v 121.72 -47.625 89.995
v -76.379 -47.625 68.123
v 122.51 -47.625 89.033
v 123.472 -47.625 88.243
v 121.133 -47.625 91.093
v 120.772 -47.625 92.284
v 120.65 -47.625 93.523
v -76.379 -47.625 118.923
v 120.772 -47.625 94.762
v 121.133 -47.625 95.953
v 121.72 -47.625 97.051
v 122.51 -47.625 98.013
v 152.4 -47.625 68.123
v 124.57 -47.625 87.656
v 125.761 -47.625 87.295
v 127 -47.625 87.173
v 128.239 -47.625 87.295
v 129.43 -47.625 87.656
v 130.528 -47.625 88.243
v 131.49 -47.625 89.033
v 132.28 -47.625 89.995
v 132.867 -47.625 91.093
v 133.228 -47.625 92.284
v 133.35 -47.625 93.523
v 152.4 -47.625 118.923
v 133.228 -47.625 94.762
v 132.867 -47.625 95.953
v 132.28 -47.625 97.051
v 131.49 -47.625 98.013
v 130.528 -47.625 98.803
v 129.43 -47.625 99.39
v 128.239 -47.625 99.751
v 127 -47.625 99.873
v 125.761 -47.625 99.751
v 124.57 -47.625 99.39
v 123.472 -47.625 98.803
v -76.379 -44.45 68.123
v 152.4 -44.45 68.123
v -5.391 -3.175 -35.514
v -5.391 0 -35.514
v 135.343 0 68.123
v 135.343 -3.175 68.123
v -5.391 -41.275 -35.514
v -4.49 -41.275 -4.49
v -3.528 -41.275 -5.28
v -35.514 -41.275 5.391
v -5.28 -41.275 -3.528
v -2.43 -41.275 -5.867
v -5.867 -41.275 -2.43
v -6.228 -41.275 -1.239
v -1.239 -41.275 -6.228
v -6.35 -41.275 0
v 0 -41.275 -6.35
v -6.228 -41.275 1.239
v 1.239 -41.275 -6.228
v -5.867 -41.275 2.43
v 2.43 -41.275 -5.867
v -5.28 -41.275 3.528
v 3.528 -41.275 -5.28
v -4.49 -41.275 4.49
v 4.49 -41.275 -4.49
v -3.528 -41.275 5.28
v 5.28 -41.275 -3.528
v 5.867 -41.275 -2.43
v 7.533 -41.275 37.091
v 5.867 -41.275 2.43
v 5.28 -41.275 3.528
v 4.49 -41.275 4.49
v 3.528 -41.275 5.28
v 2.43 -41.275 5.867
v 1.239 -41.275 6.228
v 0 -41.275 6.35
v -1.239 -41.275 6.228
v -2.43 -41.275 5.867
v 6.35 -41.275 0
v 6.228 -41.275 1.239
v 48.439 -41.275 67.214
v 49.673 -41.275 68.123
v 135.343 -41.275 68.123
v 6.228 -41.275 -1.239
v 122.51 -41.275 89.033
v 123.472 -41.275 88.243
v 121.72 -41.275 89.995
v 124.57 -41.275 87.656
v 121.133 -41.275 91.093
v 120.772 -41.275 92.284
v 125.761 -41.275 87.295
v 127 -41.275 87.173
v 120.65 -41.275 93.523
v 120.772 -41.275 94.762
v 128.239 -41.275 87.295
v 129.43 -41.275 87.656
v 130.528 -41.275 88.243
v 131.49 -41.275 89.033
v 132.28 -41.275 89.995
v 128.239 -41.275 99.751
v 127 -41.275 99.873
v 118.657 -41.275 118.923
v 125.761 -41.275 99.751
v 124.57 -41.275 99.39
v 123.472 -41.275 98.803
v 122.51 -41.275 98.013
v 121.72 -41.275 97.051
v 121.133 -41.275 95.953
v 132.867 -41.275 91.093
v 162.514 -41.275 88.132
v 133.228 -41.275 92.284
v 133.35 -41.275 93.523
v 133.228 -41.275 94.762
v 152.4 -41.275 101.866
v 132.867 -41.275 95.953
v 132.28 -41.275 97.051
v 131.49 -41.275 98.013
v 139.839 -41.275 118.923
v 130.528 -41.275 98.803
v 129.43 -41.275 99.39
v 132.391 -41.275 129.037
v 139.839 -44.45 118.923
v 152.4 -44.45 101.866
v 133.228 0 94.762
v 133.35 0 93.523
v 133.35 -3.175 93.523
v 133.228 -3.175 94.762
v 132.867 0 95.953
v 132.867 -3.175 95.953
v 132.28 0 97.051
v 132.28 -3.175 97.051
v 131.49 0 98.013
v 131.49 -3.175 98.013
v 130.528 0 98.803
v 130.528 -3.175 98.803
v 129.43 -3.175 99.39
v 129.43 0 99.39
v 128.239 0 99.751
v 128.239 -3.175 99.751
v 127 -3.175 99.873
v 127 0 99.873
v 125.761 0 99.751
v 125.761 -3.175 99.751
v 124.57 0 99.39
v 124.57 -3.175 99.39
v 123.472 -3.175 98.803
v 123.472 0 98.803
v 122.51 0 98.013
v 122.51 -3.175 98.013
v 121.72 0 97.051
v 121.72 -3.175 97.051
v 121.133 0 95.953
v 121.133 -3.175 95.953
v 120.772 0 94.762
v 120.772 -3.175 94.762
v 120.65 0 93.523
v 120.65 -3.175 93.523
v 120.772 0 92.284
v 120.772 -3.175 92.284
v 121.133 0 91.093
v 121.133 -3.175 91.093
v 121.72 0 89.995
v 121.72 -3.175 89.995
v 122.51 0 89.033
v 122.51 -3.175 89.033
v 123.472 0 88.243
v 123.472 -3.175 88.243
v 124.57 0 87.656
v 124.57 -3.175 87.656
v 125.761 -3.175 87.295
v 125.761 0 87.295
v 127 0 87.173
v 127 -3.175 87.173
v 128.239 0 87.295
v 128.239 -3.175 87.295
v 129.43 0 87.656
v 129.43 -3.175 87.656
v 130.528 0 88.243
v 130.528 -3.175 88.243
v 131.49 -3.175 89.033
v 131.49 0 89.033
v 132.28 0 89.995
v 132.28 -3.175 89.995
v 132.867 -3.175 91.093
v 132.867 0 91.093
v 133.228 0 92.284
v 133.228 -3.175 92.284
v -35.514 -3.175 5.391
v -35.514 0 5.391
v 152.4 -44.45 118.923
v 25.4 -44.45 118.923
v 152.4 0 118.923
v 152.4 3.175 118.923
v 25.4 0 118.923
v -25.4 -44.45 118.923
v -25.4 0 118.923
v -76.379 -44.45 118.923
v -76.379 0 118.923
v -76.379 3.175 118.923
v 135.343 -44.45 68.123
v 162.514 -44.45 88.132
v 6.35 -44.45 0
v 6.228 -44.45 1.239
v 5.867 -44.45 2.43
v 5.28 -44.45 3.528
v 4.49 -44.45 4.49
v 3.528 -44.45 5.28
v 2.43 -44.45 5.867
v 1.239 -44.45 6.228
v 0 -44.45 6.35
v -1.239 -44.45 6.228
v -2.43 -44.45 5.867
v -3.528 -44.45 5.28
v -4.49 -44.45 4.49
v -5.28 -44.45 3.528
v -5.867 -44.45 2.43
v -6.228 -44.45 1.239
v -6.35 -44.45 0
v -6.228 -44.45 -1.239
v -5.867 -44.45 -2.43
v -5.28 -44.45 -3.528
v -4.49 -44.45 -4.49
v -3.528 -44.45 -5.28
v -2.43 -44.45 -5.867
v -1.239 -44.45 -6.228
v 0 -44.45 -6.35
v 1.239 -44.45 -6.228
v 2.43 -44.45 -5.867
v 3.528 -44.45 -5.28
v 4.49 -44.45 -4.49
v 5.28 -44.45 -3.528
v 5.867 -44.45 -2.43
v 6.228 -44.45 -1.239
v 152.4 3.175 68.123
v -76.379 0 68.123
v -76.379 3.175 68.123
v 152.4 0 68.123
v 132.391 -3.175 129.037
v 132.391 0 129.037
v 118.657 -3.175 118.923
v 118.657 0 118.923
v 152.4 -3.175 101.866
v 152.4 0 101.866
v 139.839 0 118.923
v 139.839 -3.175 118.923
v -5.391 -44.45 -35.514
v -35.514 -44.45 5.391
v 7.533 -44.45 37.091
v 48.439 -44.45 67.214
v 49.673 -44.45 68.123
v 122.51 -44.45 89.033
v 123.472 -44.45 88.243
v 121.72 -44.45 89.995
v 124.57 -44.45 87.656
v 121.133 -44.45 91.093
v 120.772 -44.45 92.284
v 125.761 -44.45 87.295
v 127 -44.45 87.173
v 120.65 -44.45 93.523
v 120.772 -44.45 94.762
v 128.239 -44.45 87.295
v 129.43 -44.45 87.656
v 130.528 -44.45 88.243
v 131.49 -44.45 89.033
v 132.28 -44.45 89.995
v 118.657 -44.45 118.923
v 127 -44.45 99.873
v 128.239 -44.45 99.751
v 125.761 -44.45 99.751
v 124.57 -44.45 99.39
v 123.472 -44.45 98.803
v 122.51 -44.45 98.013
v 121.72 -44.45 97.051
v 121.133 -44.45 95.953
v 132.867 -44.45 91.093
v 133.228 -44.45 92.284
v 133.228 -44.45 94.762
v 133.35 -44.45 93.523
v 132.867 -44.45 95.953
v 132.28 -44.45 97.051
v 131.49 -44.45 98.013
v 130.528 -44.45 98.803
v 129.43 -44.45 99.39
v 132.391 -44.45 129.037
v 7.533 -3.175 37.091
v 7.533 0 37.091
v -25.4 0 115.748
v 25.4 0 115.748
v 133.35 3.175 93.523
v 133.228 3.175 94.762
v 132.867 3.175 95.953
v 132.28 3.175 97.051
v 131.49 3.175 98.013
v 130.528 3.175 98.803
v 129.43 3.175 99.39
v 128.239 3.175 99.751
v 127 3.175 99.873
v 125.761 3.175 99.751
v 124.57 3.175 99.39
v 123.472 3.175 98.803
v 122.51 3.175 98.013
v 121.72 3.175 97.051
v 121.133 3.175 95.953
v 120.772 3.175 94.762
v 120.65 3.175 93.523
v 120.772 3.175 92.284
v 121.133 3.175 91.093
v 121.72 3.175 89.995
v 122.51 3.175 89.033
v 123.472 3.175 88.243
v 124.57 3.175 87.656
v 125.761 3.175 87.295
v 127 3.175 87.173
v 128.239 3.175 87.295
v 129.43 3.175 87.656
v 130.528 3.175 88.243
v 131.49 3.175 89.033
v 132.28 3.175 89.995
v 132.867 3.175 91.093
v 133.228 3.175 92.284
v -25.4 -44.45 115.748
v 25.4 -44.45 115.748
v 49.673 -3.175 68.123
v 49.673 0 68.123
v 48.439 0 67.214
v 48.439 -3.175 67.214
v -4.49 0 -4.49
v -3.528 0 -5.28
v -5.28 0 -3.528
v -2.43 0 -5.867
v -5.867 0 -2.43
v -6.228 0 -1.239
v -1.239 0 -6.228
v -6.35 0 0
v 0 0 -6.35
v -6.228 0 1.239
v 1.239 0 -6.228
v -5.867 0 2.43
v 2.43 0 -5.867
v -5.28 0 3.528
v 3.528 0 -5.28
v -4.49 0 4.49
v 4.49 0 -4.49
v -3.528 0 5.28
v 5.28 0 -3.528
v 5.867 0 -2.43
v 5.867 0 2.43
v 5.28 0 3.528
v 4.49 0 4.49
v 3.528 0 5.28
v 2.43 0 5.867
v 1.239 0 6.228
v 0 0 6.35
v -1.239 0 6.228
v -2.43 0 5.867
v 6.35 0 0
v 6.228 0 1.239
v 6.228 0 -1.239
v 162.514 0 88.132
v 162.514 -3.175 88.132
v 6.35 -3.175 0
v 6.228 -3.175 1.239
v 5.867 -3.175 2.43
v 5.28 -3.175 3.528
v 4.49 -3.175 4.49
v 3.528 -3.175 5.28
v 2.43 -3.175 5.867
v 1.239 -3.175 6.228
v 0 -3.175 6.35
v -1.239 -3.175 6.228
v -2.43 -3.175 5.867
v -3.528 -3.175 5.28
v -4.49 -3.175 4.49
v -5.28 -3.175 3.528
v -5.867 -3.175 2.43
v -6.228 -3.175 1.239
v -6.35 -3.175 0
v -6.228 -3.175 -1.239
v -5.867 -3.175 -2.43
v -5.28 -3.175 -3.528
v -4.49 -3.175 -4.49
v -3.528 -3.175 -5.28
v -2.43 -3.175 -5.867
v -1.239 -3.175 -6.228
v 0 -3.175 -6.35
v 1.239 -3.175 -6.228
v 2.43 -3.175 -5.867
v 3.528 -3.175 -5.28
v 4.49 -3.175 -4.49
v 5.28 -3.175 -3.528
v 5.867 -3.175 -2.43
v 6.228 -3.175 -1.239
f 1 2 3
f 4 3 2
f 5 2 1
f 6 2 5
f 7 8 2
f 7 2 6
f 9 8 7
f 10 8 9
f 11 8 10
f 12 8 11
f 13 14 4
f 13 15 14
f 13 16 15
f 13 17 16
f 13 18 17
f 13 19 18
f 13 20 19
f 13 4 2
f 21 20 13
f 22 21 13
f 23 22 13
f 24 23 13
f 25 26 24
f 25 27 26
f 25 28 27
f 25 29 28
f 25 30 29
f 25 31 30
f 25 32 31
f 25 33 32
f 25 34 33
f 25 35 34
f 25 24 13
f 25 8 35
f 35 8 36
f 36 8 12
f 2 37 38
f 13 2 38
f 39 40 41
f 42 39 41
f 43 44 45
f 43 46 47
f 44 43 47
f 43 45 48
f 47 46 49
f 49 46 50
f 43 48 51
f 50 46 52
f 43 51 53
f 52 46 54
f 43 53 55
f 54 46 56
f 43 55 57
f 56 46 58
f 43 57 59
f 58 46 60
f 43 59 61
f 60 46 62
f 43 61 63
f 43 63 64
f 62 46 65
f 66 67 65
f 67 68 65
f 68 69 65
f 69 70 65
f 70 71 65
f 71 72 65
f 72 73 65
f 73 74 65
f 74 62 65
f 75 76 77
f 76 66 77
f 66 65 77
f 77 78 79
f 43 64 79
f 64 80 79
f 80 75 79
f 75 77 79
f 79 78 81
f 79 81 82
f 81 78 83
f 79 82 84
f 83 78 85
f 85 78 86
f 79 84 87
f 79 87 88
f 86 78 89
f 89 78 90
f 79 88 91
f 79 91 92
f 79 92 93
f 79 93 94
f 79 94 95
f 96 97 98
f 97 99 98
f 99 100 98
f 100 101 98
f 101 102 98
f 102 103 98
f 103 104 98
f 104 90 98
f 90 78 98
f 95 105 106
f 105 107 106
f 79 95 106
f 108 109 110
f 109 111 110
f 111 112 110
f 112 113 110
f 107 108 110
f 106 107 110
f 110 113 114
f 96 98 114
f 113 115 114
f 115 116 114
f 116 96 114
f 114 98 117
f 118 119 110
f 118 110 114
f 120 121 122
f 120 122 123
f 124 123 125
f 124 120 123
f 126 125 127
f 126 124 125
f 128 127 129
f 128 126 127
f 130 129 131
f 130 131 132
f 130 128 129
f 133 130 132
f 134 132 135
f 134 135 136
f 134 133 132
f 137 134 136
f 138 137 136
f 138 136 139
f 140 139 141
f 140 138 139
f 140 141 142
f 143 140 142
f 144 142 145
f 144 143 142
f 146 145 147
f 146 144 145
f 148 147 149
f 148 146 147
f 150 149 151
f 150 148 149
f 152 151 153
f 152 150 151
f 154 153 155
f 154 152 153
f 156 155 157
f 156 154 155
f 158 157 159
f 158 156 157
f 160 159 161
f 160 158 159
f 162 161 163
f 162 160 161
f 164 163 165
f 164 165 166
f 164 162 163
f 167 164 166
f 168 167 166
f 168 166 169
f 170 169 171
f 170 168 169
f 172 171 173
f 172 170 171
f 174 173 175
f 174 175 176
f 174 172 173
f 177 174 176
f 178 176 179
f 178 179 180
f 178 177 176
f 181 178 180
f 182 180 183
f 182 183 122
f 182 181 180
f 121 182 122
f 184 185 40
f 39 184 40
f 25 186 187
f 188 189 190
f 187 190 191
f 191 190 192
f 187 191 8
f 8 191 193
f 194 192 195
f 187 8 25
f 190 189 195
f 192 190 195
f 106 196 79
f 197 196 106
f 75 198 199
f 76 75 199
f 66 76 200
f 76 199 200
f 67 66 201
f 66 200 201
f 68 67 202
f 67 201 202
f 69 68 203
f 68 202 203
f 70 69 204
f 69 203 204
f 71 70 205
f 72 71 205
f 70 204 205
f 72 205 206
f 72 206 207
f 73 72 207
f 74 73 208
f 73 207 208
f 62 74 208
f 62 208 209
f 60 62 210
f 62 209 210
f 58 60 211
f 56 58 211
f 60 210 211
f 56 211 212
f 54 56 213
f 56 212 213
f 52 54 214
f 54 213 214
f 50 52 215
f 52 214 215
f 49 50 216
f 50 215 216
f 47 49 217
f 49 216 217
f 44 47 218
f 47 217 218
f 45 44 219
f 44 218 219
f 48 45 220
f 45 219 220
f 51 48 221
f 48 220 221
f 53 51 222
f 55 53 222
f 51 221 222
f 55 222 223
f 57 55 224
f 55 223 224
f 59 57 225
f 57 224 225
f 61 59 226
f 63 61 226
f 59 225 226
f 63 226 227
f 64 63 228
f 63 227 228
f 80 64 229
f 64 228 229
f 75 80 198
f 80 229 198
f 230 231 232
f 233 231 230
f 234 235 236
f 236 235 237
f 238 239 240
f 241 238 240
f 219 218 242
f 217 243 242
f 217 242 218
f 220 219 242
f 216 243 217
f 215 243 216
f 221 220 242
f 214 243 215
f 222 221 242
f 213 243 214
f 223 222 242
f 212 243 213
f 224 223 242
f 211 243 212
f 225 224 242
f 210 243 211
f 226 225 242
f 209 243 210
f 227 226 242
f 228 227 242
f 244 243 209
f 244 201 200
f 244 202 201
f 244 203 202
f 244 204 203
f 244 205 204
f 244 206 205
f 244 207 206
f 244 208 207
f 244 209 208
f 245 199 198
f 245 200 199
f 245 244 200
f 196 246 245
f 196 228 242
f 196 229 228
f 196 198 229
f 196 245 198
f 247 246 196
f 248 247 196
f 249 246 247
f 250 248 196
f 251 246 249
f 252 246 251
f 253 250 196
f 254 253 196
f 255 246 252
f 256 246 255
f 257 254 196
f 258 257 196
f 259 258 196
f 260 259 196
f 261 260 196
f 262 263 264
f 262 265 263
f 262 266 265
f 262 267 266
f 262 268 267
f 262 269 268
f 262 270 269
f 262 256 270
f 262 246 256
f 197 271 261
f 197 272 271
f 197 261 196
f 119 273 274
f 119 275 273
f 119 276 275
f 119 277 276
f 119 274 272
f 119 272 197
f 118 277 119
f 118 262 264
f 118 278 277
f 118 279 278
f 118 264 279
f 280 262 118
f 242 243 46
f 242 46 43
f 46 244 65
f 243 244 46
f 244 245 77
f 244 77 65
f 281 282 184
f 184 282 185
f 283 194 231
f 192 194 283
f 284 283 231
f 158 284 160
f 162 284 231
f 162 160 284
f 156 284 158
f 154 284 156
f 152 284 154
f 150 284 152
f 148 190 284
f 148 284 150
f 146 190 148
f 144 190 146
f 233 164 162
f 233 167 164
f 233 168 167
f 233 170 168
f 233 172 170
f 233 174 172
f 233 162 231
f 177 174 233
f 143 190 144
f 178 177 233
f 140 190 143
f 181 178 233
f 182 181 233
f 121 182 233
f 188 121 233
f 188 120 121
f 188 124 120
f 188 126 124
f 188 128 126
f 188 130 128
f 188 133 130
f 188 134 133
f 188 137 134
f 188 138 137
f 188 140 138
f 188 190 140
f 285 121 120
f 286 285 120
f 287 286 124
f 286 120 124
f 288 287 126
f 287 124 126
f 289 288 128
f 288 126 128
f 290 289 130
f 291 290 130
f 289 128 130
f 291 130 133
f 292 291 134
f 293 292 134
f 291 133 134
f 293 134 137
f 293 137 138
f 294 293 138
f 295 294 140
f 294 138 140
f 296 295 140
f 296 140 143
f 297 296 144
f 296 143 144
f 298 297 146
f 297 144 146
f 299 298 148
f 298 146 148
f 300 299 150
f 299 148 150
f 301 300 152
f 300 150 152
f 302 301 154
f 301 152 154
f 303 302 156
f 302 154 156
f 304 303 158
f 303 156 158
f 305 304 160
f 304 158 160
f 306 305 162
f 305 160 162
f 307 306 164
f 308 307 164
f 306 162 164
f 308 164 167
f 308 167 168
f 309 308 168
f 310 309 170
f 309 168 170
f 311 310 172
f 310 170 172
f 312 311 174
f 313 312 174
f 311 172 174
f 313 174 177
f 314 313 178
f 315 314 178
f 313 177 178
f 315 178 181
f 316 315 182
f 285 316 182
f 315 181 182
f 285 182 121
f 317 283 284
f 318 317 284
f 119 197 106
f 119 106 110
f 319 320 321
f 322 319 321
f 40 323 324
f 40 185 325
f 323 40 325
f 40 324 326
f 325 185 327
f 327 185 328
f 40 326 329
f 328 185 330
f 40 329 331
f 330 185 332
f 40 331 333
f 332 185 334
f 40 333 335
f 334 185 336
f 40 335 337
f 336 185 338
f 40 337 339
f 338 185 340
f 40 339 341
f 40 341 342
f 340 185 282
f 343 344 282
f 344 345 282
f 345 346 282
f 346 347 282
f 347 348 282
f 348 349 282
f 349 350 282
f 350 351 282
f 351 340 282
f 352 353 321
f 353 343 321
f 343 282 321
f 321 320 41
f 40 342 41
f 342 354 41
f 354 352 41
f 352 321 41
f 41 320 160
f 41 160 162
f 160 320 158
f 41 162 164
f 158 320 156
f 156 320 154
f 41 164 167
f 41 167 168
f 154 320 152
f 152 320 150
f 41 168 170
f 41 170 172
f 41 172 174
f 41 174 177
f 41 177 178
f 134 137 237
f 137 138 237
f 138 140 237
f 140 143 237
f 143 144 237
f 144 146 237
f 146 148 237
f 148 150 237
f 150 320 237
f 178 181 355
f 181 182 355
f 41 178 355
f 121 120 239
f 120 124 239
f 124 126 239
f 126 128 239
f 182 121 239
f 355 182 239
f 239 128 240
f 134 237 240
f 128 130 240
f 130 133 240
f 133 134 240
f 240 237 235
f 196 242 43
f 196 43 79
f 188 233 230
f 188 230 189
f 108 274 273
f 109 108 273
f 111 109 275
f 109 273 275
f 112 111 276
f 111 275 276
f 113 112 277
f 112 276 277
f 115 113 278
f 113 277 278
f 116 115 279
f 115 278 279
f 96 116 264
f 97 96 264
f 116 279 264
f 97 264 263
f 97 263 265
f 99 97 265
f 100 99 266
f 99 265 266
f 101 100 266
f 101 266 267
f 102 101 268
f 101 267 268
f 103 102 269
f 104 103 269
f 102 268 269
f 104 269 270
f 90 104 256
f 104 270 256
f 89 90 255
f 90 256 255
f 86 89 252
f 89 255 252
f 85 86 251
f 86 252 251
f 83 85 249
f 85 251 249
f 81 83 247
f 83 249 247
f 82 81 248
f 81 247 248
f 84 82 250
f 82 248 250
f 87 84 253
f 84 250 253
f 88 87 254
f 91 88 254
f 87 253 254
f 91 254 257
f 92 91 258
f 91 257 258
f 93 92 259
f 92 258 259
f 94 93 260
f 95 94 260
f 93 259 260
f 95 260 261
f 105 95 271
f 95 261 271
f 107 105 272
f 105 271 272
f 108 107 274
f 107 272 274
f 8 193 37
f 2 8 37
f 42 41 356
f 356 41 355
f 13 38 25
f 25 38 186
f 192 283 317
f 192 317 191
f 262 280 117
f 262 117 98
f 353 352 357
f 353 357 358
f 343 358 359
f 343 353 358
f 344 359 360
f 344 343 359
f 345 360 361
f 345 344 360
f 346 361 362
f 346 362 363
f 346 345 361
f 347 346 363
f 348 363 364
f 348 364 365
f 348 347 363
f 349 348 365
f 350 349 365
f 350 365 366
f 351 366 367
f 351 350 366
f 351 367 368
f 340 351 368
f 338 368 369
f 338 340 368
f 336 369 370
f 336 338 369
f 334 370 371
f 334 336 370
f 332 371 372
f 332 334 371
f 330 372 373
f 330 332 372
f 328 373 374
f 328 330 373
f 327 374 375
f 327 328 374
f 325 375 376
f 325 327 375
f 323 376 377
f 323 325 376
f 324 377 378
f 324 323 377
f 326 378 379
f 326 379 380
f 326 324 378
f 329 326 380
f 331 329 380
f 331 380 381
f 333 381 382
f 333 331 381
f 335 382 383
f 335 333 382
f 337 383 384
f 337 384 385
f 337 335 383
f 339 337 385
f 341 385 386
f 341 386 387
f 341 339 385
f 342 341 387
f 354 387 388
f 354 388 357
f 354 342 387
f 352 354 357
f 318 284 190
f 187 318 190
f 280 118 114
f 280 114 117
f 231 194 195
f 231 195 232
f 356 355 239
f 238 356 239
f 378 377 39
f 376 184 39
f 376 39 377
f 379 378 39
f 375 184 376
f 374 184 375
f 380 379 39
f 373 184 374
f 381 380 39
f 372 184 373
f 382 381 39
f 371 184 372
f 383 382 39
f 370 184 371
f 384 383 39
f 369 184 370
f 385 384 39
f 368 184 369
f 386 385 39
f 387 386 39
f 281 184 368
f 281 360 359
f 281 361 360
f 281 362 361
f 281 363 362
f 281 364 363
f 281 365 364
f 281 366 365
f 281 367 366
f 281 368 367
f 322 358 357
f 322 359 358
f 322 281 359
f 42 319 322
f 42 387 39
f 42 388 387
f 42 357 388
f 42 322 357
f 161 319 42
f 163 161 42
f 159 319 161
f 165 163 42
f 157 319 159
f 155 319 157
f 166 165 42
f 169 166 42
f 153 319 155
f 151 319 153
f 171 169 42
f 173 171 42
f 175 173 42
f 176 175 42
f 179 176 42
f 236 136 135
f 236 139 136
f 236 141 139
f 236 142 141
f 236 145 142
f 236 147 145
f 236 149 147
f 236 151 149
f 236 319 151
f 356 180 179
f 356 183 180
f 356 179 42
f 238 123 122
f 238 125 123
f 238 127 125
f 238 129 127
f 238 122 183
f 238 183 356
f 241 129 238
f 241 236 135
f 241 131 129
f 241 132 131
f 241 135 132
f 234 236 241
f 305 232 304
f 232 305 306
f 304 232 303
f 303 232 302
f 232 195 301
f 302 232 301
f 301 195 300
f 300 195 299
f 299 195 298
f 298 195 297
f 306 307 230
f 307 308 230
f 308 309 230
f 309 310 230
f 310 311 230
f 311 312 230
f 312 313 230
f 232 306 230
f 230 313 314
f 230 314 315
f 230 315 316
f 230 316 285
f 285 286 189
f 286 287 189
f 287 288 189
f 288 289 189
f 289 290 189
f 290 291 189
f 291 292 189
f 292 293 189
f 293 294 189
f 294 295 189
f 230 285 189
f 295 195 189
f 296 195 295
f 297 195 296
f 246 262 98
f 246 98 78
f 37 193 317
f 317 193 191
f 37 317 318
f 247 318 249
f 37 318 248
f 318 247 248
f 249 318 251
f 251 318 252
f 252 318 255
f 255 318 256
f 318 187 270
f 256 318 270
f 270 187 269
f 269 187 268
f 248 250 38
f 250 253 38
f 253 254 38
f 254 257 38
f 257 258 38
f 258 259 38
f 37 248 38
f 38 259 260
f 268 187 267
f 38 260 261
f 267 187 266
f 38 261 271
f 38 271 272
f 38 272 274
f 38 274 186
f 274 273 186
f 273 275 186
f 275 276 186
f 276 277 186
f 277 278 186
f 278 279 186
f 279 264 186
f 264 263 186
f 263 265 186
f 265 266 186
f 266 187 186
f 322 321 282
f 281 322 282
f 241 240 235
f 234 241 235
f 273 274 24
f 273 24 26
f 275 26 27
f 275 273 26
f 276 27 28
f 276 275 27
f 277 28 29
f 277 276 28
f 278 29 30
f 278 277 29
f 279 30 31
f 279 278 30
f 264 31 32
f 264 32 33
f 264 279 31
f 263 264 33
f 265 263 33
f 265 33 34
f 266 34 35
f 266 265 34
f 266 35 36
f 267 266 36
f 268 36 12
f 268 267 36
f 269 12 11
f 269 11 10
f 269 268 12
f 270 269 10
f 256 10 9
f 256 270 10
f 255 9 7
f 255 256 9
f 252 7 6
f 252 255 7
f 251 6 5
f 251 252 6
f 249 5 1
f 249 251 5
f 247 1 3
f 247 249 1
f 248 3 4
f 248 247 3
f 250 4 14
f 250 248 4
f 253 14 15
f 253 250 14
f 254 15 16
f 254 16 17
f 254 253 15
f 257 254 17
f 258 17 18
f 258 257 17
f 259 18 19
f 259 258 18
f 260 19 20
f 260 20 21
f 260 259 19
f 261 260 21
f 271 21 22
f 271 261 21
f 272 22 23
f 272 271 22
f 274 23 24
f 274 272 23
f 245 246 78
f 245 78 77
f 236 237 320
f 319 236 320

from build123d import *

# Parameters (mm, degrees)
F0_R     = 6.35
F1_DEPTH = 3.175
F0_W     = 50.8
F0_H     = 3.175
F2_DEPTH = 3.175
F5_DEPTH = 44.45


# Not quite as in the source:
# - a feature names something its author has since deleted; it is built from what else it names


with BuildPart() as f1:
    # F0 (on Front) → F1 (new body)
    with BuildSketch(Plane.XZ):
        Polygon((118.6567593262, 118.9230999827), (49.6727329072, 68.1230999827), (135.3432406738, 68.1230999827), (152.4, 80.6837378398), (152.4, 101.8663406565), (139.8393621429, 118.9230999827), align=None)
        with Locations((127, 93.5230999827)):
            Circle(F0_R, mode=Mode.SUBTRACT)
        Polygon((152.4, 101.8663406565), (152.4, 80.6837378398), (162.5141384166, 88.1318132601), align=None)
        Polygon((132.3912867226, 129.0372383994), (118.6567593262, 118.9230999827), (139.8393621429, 118.9230999827), align=None)
        Polygon((49.6727329072, 68.1230999827), (48.438574153, 67.214262561), (50.3212523839, 64.6576734898), (9.4158272446, 34.5348217958), (7.5331490138, 37.091410867), (-35.5141384166, 5.3912867226), (-5.3912867226, -35.5141384166), (135.3432406738, 68.1230999827), align=None)
        Circle(F0_R, mode=Mode.SUBTRACT)
        Polygon((50.3212523839, 64.6576734898), (48.438574153, 67.214262561), (7.5331490138, 37.091410867), (9.4158272446, 34.5348217958), align=None)
    extrude(amount=F1_DEPTH)


with BuildPart() as f2:
    # F0 (on Front) → F2 (new body)
    with BuildSketch(Plane.XZ):
        Polygon((-76.3788797785, 68.1230999827), (49.6727329072, 68.1230999827), (118.6567593262, 118.9230999827), (25.4, 118.9230999827), (25.4, 115.7480999827), (-25.4, 115.7480999827), (-25.4, 118.9230999827), (-76.3788797785, 118.9230999827), align=None)
        Polygon((118.6567593262, 118.9230999827), (49.6727329072, 68.1230999827), (135.3432406738, 68.1230999827), (152.4, 80.6837378398), (152.4, 101.8663406565), (139.8393621429, 118.9230999827), align=None)
        with Locations((127, 93.5230999827)):
            Circle(F0_R, mode=Mode.SUBTRACT)
        Polygon((152.4, 80.6837378398), (135.3432406738, 68.1230999827), (152.4, 68.1230999827), align=None)
        Polygon((152.4, 118.9230999827), (139.8393621429, 118.9230999827), (152.4, 101.8663406565), align=None)
        with Locations((0, 117.3355999827)):
            Rectangle(F0_W, F0_H)
    extrude(amount=-F2_DEPTH)


with BuildPart() as f4_1:
    # F4: instance of F1
    add(f1.part.mirror(Plane(origin=(63.5, -22.225, 46.7615499914), x_dir=(1, 0, 0), z_dir=(0, -1, 0))))


with BuildPart() as f4_2:
    # F4: instance of F2
    add(f2.part.mirror(Plane(origin=(63.5, -22.225, 46.7615499914), x_dir=(1, 0, 0), z_dir=(0, -1, 0))))


with BuildPart() as f2_1:
    add(f2.part)

    add(f4_2.part)  # F5 merges F4_2
    # F0 (on Front) → F5 (join, through all)
    with BuildSketch(Plane.XZ):
        with Locations((0, 117.3355999827)):
            Rectangle(F0_W, F0_H)
    extrude(amount=F5_DEPTH)


solid = Compound([f1.part, f4_1.part, f2_1.part])
